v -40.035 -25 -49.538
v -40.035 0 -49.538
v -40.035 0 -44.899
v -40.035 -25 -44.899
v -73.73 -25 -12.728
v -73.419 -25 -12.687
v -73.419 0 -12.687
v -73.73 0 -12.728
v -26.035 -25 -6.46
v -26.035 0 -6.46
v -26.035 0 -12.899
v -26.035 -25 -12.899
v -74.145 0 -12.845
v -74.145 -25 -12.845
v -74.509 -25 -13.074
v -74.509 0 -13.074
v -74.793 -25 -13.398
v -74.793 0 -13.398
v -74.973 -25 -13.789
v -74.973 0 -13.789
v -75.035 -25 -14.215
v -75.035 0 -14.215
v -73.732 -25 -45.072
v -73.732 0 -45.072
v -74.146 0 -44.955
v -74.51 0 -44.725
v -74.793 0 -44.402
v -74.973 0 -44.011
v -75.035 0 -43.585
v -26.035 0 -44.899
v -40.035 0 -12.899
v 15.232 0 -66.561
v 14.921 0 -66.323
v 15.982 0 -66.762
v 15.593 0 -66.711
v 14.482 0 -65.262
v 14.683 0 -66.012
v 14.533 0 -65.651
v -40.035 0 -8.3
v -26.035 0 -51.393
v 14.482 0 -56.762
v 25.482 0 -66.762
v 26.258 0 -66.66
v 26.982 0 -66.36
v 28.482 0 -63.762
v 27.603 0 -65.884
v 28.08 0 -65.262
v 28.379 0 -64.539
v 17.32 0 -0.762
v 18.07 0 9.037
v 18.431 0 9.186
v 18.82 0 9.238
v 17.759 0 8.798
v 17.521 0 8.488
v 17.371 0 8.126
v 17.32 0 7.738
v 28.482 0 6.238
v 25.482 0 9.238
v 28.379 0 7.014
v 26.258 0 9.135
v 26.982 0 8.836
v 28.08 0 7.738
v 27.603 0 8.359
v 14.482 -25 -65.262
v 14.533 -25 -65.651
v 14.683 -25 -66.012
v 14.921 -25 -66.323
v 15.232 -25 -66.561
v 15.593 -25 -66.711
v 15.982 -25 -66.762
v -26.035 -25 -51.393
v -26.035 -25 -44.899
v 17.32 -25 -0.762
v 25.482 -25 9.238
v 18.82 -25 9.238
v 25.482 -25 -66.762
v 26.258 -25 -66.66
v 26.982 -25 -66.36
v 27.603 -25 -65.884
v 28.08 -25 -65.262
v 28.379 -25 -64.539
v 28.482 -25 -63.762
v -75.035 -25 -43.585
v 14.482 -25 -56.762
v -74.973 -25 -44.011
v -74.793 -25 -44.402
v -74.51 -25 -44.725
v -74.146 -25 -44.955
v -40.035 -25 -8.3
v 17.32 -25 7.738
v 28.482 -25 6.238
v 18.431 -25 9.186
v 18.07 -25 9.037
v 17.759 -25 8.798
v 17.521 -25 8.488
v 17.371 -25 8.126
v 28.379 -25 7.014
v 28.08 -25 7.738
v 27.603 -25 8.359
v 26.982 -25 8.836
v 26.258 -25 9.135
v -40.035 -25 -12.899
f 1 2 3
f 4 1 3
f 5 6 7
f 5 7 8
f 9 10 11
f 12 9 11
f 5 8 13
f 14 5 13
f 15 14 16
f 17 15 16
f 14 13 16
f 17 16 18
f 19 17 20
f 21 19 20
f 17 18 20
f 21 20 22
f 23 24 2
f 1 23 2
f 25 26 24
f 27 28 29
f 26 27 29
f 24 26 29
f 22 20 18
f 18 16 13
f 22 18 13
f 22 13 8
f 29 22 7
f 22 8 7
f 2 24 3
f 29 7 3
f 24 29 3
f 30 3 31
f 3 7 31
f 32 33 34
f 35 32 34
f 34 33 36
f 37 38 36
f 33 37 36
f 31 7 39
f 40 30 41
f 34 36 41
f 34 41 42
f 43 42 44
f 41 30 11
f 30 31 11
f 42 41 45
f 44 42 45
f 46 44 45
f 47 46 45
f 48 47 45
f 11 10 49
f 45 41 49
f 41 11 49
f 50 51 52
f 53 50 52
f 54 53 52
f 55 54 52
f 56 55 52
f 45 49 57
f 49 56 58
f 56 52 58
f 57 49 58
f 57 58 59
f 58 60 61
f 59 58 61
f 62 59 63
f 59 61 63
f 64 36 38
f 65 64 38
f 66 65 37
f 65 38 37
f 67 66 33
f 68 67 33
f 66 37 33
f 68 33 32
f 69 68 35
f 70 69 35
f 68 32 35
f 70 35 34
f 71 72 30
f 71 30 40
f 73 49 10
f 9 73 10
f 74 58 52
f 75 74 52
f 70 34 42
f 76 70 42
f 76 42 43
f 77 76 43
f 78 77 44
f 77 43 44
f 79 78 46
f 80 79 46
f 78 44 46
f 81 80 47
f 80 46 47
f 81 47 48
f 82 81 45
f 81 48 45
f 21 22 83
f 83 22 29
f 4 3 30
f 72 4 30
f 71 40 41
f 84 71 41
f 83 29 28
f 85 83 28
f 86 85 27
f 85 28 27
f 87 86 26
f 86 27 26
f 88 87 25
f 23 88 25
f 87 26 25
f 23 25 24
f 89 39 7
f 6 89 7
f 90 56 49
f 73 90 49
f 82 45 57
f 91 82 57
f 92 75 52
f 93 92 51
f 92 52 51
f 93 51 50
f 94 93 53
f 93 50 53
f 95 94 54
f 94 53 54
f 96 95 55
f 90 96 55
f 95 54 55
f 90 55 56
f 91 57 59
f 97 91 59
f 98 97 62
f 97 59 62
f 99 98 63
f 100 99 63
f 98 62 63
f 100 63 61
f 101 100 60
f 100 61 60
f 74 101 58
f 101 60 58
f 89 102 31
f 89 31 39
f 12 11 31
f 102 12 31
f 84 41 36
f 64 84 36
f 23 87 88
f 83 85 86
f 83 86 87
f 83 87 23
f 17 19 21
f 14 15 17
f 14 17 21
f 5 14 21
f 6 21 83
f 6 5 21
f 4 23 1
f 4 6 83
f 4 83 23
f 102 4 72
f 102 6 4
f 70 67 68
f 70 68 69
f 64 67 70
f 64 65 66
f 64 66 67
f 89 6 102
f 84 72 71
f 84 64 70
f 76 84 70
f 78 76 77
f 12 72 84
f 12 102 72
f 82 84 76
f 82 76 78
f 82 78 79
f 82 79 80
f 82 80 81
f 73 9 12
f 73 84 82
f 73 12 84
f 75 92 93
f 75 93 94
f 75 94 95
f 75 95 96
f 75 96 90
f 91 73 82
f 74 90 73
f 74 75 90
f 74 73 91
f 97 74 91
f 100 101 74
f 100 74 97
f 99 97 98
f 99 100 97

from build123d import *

# Parameters (mm, degrees)
F1_DEPTH = 25


with BuildPart() as f1:
    # F0 (on Front) → F1 (new body)
    with BuildSketch(Plane.XZ):
        with BuildLine():
            ThreePointArc((28.481623, 6.237598), (27.602944, 8.358919), (25.481623, 9.237598))
            Line((25.481623, 9.237598), (18.819672, 9.237598))
            ThreePointArc((18.819672, 9.237598), (17.759012, 8.798258), (17.319672, 7.737598))
            Line((17.319672, 7.737598), (17.319672, -0.762402))
            Line((17.319672, -0.762402), (-26.034861, -6.459927))
            Line((-26.034861, -6.459927), (-26.034861, -12.899362))
            Line((-26.034861, -12.899362), (-40.034861, -12.899362))
            Line((-40.034861, -12.899362), (-40.034861, -8.299765))
            Line((-40.034861, -8.299765), (-73.418925, -12.687001))
            Line((-73.418925, -12.687001), (-73.730306, -12.727921))
            ThreePointArc((-73.730306, -12.727921), (-74.662506, -13.225985), (-75.034861, -14.215134))
            Line((-75.034861, -14.215134), (-75.034861, -43.585033))
            ThreePointArc((-75.034861, -43.585033), (-74.663044, -44.573569), (-73.731923, -45.072032))
            Line((-73.731923, -45.072032), (-40.034861, -49.537685))
            Line((-40.034861, -49.537685), (-40.034861, -44.899362))
            Line((-40.034861, -44.899362), (-26.034861, -44.899362))
            Line((-26.034861, -44.899362), (-26.034861, -51.393015))
            Line((-26.034861, -51.393015), (14.481623, -56.762402))
            Line((14.481623, -56.762402), (14.481623, -65.262402))
            ThreePointArc((14.481623, -65.262402), (14.920963, -66.323062), (15.981623, -66.762402))
            Line((15.981623, -66.762402), (25.481623, -66.762402))
            ThreePointArc((25.481623, -66.762402), (27.602944, -65.883722), (28.481623, -63.762402))
            Line((28.481623, -63.762402), (28.481623, 6.237598))
        make_face()
    extrude(amount=F1_DEPTH)


solid = f1.part
